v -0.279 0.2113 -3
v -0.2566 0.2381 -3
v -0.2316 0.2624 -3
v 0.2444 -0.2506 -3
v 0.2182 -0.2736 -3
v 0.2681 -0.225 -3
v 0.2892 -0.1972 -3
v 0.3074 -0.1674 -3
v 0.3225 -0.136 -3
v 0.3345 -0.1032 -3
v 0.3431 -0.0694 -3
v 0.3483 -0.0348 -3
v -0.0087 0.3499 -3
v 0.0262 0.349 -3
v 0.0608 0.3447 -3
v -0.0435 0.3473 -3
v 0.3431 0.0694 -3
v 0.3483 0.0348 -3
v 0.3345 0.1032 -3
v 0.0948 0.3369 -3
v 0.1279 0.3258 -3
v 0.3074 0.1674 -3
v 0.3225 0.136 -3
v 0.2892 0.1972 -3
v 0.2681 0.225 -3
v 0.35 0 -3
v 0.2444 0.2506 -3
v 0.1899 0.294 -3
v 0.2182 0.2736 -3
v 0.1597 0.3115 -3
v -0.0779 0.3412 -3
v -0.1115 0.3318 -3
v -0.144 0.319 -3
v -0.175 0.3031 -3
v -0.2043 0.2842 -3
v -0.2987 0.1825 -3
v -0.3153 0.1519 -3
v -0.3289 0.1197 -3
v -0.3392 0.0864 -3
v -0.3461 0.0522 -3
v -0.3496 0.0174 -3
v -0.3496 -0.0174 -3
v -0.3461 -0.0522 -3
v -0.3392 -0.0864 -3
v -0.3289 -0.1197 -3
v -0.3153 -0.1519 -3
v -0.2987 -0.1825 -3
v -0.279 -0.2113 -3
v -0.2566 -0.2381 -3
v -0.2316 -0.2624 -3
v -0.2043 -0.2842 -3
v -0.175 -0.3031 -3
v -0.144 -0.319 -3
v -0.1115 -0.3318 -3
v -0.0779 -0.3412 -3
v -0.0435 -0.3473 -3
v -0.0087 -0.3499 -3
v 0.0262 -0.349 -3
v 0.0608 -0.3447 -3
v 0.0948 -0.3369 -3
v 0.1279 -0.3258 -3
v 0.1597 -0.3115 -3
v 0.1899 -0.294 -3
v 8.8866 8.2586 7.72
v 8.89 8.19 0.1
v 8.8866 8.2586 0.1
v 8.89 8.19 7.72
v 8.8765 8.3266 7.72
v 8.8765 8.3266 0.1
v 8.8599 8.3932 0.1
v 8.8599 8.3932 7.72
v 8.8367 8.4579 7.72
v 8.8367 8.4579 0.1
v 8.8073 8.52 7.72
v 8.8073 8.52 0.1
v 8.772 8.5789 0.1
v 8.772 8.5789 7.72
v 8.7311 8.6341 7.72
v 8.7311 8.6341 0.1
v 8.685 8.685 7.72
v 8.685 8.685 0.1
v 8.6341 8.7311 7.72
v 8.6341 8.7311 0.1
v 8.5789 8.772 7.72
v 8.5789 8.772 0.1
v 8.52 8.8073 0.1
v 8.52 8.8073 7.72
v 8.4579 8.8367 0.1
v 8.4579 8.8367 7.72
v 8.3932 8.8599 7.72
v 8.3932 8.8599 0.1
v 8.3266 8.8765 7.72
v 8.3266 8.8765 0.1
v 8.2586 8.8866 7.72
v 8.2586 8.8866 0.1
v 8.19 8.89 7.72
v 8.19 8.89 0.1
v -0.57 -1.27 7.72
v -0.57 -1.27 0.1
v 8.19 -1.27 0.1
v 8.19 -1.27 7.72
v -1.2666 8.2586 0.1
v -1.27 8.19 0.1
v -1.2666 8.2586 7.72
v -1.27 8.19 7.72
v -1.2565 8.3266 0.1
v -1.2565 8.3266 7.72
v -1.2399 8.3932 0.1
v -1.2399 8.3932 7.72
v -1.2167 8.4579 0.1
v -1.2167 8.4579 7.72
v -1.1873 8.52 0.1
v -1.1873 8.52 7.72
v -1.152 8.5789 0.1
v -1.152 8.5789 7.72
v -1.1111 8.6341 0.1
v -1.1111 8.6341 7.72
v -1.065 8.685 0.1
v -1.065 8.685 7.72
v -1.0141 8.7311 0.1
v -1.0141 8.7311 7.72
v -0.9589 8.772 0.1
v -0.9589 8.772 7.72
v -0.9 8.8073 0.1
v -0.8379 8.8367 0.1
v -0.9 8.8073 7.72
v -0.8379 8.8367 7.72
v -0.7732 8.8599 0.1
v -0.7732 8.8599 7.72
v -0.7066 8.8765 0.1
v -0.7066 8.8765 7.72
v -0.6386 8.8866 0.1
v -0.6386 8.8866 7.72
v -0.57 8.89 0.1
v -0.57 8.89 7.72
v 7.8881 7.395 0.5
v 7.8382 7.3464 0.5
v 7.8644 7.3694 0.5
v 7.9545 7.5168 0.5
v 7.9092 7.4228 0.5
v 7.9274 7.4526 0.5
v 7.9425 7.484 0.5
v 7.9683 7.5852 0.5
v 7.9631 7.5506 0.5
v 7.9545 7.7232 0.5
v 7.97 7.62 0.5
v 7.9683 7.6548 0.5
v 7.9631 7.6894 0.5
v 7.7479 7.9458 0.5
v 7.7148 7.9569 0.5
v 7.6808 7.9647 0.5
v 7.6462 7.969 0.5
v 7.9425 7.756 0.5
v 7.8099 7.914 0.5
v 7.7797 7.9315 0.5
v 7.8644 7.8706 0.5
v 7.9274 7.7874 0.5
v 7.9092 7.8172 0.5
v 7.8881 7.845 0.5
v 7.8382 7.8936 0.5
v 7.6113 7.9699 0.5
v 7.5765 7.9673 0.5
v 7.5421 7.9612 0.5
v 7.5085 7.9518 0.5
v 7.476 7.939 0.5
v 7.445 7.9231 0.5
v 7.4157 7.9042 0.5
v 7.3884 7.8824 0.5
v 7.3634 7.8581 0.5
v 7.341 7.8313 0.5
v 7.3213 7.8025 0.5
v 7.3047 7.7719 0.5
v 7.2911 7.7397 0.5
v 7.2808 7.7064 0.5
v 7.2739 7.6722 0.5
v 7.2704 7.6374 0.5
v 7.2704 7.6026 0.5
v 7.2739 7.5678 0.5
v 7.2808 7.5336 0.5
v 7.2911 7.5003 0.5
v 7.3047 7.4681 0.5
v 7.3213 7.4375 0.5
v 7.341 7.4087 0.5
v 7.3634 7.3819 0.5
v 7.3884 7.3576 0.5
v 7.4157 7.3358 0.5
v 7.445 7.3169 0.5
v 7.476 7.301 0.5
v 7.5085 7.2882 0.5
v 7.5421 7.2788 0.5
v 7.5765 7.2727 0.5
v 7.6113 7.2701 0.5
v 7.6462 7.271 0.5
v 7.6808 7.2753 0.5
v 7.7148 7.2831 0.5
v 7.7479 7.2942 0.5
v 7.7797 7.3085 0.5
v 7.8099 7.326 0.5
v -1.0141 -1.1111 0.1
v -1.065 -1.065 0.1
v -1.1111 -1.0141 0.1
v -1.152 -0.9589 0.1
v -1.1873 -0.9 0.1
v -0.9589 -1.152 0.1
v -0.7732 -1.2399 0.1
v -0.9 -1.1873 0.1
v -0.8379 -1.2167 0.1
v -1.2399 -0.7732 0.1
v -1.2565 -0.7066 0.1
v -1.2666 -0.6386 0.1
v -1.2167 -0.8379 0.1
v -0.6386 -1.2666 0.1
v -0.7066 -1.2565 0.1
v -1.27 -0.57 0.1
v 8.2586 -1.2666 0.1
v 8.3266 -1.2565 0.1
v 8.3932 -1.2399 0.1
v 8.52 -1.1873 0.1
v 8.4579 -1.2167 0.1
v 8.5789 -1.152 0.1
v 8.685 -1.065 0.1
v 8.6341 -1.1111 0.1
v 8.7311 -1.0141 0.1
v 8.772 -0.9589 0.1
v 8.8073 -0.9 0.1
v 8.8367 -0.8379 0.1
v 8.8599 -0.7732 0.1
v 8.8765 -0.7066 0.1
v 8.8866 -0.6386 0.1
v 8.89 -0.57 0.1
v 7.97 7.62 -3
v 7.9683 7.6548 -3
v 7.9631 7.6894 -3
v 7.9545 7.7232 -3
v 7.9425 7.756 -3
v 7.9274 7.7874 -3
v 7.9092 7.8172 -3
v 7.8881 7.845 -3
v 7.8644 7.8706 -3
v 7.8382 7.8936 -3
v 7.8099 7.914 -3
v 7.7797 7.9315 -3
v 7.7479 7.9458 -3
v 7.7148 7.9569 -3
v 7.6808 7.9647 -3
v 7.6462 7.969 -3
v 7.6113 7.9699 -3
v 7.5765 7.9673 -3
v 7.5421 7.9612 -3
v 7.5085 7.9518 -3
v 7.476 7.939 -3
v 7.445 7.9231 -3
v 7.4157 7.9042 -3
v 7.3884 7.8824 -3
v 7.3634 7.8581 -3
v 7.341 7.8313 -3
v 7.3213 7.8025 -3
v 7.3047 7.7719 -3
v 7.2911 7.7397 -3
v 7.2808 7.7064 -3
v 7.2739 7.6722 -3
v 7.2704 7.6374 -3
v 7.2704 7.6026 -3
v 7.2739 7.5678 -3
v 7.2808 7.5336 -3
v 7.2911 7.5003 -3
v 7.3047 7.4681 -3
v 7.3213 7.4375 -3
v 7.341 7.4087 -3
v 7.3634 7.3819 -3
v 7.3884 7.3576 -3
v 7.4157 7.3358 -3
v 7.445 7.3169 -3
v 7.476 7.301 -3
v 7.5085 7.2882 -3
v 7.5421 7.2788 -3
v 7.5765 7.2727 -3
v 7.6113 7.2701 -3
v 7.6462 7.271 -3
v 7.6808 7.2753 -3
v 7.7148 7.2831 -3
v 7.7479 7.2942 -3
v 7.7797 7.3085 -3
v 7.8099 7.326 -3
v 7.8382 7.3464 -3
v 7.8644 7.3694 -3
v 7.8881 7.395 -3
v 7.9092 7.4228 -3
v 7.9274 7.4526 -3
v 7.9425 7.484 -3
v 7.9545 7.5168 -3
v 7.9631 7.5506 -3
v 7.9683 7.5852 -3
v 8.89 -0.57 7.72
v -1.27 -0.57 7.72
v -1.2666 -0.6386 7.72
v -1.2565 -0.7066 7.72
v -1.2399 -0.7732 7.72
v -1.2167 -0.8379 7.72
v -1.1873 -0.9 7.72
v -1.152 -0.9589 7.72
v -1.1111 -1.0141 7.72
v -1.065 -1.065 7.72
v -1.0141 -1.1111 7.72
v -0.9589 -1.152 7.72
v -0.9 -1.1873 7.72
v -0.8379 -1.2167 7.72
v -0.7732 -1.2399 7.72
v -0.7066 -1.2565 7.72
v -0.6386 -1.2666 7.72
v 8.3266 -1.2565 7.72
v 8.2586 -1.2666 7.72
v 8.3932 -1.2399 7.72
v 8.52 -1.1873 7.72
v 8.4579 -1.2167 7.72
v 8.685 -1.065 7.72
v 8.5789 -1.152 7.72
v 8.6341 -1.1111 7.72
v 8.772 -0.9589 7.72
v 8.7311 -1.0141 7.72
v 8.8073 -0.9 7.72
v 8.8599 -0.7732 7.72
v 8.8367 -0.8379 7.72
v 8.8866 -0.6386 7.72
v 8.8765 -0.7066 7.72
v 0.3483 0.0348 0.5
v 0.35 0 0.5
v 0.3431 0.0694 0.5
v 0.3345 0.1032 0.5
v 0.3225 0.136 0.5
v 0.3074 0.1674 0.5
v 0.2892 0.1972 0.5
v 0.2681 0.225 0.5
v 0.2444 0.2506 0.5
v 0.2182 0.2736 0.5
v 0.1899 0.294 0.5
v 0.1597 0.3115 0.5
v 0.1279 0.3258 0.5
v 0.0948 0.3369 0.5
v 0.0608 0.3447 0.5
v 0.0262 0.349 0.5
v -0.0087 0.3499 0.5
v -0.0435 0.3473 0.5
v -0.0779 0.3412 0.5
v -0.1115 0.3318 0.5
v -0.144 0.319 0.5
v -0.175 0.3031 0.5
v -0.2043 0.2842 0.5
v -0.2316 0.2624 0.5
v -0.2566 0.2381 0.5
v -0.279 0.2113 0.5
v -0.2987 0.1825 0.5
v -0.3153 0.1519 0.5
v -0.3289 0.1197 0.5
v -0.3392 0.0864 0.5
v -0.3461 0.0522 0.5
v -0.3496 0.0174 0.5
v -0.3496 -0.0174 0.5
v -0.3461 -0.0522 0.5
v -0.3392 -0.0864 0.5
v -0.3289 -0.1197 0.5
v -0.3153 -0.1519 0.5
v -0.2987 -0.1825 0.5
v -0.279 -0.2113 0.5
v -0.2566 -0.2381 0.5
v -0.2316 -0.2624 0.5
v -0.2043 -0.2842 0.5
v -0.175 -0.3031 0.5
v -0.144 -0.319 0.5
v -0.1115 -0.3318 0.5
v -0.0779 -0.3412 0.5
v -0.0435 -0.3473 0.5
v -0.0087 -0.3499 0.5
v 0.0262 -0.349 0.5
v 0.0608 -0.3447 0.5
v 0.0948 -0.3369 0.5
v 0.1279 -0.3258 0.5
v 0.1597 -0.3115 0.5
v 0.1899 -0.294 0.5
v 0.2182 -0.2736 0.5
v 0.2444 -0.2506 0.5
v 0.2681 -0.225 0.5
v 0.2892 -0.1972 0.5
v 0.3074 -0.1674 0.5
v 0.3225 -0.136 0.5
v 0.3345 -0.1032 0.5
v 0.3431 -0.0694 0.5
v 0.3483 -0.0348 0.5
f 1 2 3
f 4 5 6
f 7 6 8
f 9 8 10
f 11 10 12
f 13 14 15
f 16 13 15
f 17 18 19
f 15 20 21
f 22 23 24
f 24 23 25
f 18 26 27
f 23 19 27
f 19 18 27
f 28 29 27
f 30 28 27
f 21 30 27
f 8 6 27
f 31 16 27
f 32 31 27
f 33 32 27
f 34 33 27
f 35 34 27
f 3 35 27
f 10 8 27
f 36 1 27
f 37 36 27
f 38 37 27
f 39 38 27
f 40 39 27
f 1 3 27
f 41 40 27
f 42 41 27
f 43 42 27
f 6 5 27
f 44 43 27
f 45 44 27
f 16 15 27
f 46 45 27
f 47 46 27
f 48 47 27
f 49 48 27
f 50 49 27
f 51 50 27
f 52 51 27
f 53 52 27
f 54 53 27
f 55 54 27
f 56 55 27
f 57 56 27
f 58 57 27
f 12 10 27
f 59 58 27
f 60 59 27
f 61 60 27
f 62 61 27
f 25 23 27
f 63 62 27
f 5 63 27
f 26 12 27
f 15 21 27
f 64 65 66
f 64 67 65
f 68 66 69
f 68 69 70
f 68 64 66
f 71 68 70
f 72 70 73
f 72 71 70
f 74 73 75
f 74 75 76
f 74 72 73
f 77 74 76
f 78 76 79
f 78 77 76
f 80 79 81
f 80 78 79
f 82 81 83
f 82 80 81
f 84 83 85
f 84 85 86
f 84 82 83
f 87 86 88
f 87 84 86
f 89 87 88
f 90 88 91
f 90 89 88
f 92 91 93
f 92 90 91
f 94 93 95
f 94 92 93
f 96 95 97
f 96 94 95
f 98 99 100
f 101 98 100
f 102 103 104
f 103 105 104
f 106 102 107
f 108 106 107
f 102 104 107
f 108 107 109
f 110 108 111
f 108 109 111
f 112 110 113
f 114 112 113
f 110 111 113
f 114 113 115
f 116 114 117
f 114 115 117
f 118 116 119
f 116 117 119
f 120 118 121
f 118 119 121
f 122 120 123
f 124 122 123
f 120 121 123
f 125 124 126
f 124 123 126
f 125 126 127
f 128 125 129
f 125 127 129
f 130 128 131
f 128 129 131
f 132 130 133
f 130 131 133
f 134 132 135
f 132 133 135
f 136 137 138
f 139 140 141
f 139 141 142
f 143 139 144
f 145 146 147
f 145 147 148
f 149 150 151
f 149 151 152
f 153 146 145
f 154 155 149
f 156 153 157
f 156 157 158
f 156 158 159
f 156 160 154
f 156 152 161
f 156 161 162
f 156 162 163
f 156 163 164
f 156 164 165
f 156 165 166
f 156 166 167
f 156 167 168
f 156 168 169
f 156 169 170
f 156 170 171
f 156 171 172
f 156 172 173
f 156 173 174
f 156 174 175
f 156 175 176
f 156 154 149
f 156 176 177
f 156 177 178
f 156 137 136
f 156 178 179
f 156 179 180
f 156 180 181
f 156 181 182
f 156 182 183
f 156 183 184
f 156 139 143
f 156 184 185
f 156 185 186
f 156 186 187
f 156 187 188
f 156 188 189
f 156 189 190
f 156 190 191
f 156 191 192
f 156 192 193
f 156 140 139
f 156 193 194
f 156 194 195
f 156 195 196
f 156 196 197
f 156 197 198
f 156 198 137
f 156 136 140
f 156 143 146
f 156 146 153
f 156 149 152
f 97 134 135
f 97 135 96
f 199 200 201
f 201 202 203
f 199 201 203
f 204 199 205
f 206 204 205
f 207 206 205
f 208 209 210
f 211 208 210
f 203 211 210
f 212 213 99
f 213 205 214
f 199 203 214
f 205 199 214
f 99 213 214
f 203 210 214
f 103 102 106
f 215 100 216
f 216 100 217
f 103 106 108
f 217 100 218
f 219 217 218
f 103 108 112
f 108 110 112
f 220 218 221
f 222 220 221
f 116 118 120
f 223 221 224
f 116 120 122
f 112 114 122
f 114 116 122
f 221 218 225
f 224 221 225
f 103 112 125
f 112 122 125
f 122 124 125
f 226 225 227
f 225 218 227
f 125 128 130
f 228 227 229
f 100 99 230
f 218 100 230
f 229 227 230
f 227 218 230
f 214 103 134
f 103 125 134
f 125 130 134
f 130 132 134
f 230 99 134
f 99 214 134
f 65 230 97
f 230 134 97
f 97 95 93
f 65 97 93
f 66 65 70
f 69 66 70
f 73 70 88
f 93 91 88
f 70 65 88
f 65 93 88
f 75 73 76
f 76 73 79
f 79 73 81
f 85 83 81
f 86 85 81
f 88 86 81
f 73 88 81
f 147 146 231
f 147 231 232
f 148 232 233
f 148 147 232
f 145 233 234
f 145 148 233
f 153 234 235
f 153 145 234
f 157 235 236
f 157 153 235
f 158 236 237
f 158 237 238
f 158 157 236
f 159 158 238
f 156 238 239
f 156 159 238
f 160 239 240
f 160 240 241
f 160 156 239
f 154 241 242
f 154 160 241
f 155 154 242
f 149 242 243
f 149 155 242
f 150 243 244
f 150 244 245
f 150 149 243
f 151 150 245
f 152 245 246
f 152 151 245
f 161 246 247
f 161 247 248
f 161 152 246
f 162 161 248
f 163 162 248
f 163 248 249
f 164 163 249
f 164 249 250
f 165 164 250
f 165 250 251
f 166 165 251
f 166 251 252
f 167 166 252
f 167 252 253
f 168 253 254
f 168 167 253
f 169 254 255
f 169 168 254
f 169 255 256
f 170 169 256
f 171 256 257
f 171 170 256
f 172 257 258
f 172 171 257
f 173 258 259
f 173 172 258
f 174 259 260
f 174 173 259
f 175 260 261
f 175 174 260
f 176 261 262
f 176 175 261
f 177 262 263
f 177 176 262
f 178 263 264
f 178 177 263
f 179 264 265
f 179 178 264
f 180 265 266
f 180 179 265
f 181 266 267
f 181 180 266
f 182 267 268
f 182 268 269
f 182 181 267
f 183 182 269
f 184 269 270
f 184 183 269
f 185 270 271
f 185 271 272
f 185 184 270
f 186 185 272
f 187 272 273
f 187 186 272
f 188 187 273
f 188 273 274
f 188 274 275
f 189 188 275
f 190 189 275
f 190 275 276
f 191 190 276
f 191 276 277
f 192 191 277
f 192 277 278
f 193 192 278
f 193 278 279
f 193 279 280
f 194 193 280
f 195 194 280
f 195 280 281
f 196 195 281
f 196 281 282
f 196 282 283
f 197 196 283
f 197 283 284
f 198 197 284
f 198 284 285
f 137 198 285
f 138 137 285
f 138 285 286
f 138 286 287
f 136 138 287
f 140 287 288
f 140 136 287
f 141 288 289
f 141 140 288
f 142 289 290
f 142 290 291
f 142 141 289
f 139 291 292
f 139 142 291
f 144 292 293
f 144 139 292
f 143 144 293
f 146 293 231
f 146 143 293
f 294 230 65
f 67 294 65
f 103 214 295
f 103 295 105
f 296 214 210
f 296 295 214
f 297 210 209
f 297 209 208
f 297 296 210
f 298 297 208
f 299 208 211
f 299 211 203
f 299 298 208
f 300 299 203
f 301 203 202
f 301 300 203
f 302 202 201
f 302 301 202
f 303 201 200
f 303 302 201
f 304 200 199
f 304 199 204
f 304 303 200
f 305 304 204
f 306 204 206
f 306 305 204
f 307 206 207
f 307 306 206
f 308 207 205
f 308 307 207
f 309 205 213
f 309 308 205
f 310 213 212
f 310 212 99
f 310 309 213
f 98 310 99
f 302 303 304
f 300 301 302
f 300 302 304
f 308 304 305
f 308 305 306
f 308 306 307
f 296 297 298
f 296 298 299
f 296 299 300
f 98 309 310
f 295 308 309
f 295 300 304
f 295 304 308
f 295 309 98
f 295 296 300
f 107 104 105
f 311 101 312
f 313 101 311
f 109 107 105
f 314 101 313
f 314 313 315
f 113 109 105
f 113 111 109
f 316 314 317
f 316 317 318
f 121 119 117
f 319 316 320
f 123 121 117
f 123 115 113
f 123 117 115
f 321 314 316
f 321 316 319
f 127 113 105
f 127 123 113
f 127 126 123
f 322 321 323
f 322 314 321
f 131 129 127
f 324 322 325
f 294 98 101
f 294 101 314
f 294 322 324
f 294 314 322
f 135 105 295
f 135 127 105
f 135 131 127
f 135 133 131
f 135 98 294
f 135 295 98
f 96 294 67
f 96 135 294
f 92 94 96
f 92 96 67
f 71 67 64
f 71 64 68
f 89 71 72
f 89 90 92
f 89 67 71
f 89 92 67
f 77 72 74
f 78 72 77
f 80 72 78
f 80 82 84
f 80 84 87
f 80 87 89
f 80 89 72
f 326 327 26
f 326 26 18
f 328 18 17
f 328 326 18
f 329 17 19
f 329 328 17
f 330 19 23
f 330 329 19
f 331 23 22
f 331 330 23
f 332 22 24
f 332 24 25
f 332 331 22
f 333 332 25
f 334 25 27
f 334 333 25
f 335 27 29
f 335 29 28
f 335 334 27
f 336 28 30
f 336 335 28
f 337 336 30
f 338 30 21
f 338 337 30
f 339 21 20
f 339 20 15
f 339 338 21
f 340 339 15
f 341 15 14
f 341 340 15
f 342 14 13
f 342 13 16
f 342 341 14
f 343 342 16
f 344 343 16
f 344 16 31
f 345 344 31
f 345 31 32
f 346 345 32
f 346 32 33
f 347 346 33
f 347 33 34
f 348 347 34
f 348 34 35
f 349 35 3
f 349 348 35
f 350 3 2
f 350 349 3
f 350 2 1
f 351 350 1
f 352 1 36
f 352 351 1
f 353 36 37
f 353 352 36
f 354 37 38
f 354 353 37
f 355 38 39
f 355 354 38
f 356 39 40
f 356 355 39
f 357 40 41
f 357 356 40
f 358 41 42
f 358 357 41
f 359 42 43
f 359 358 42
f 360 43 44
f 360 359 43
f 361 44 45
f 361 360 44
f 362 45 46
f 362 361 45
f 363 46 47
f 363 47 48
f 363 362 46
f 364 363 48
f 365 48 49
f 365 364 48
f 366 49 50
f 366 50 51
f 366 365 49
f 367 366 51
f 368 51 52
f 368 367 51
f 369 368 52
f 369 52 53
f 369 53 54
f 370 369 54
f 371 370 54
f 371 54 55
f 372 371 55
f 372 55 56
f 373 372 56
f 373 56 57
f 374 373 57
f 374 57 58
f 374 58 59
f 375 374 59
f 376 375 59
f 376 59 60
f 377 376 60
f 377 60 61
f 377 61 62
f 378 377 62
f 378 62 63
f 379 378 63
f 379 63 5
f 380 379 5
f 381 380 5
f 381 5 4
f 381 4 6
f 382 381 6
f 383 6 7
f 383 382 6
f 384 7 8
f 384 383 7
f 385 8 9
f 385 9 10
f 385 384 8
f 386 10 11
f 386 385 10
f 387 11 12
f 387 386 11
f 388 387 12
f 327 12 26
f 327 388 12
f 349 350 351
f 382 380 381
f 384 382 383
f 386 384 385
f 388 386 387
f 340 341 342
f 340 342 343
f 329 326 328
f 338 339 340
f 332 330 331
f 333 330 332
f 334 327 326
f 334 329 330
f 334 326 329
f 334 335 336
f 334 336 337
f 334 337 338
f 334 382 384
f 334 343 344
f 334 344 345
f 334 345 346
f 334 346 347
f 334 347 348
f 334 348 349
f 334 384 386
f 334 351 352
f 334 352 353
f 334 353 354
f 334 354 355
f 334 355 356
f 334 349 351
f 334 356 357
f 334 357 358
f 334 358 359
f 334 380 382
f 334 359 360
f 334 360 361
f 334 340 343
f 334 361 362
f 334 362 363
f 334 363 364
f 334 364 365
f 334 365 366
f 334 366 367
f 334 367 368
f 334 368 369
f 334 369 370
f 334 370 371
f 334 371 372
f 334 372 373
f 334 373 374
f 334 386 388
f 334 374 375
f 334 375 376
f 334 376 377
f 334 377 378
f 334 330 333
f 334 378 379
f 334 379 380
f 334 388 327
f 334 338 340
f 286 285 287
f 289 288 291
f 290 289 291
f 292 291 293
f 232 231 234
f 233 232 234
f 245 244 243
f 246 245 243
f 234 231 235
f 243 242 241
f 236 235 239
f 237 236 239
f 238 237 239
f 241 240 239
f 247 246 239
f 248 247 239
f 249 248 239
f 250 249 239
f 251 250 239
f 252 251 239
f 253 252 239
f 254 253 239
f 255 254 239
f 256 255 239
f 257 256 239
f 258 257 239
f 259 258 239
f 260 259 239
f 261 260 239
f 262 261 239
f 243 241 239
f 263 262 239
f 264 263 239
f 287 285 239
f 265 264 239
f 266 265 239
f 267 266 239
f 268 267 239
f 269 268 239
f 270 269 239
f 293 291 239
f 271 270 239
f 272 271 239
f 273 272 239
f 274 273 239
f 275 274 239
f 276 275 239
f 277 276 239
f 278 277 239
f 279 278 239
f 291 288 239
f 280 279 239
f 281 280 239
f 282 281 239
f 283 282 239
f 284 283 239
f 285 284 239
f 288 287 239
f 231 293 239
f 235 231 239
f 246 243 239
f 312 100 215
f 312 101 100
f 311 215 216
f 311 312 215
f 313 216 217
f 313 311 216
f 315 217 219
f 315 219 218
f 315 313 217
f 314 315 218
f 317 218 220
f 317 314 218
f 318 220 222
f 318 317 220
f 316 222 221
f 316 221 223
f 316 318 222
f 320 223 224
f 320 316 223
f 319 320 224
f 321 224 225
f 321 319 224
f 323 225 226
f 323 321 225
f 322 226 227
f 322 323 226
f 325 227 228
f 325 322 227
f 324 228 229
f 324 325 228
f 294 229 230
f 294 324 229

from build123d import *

# Parameters (mm, degrees)
SKETCH001_R  = 0.35
PAD001_DEPTH = 3.5
SKETCH_W     = 10.16
SKETCH_H     = 10.16
PAD_DEPTH    = 7.62
FILLET_R     = 0.7


with BuildPart() as pad001:
    # Sketch001 → Pad001 (new body)
    with BuildSketch(Plane.XY.offset(0.5)):
        Circle(SKETCH001_R)
        with Locations((7.62, 7.62)):
            Circle(SKETCH001_R)
    extrude(amount=-PAD001_DEPTH)


with BuildPart() as fillet_body:
    # Sketch → Pad (new body)
    with BuildSketch(Plane.XY.offset(0.1)):
        with Locations((3.81, 3.81)):
            Rectangle(SKETCH_W, SKETCH_H)
    extrude(amount=PAD_DEPTH)

    # Fillet
    fillet_edges = [fillet_body.edges().sort_by_distance(p)[0] for p in [
        (8.89, -1.27, 3.91),
        (8.89, 8.89, 3.91),
        (-1.27, -1.27, 3.91),
        (-1.27, 8.89, 3.91),
    ]]
    fillet(fillet_edges, radius=FILLET_R)


solid = Compound([pad001.part, fillet_body.part])
